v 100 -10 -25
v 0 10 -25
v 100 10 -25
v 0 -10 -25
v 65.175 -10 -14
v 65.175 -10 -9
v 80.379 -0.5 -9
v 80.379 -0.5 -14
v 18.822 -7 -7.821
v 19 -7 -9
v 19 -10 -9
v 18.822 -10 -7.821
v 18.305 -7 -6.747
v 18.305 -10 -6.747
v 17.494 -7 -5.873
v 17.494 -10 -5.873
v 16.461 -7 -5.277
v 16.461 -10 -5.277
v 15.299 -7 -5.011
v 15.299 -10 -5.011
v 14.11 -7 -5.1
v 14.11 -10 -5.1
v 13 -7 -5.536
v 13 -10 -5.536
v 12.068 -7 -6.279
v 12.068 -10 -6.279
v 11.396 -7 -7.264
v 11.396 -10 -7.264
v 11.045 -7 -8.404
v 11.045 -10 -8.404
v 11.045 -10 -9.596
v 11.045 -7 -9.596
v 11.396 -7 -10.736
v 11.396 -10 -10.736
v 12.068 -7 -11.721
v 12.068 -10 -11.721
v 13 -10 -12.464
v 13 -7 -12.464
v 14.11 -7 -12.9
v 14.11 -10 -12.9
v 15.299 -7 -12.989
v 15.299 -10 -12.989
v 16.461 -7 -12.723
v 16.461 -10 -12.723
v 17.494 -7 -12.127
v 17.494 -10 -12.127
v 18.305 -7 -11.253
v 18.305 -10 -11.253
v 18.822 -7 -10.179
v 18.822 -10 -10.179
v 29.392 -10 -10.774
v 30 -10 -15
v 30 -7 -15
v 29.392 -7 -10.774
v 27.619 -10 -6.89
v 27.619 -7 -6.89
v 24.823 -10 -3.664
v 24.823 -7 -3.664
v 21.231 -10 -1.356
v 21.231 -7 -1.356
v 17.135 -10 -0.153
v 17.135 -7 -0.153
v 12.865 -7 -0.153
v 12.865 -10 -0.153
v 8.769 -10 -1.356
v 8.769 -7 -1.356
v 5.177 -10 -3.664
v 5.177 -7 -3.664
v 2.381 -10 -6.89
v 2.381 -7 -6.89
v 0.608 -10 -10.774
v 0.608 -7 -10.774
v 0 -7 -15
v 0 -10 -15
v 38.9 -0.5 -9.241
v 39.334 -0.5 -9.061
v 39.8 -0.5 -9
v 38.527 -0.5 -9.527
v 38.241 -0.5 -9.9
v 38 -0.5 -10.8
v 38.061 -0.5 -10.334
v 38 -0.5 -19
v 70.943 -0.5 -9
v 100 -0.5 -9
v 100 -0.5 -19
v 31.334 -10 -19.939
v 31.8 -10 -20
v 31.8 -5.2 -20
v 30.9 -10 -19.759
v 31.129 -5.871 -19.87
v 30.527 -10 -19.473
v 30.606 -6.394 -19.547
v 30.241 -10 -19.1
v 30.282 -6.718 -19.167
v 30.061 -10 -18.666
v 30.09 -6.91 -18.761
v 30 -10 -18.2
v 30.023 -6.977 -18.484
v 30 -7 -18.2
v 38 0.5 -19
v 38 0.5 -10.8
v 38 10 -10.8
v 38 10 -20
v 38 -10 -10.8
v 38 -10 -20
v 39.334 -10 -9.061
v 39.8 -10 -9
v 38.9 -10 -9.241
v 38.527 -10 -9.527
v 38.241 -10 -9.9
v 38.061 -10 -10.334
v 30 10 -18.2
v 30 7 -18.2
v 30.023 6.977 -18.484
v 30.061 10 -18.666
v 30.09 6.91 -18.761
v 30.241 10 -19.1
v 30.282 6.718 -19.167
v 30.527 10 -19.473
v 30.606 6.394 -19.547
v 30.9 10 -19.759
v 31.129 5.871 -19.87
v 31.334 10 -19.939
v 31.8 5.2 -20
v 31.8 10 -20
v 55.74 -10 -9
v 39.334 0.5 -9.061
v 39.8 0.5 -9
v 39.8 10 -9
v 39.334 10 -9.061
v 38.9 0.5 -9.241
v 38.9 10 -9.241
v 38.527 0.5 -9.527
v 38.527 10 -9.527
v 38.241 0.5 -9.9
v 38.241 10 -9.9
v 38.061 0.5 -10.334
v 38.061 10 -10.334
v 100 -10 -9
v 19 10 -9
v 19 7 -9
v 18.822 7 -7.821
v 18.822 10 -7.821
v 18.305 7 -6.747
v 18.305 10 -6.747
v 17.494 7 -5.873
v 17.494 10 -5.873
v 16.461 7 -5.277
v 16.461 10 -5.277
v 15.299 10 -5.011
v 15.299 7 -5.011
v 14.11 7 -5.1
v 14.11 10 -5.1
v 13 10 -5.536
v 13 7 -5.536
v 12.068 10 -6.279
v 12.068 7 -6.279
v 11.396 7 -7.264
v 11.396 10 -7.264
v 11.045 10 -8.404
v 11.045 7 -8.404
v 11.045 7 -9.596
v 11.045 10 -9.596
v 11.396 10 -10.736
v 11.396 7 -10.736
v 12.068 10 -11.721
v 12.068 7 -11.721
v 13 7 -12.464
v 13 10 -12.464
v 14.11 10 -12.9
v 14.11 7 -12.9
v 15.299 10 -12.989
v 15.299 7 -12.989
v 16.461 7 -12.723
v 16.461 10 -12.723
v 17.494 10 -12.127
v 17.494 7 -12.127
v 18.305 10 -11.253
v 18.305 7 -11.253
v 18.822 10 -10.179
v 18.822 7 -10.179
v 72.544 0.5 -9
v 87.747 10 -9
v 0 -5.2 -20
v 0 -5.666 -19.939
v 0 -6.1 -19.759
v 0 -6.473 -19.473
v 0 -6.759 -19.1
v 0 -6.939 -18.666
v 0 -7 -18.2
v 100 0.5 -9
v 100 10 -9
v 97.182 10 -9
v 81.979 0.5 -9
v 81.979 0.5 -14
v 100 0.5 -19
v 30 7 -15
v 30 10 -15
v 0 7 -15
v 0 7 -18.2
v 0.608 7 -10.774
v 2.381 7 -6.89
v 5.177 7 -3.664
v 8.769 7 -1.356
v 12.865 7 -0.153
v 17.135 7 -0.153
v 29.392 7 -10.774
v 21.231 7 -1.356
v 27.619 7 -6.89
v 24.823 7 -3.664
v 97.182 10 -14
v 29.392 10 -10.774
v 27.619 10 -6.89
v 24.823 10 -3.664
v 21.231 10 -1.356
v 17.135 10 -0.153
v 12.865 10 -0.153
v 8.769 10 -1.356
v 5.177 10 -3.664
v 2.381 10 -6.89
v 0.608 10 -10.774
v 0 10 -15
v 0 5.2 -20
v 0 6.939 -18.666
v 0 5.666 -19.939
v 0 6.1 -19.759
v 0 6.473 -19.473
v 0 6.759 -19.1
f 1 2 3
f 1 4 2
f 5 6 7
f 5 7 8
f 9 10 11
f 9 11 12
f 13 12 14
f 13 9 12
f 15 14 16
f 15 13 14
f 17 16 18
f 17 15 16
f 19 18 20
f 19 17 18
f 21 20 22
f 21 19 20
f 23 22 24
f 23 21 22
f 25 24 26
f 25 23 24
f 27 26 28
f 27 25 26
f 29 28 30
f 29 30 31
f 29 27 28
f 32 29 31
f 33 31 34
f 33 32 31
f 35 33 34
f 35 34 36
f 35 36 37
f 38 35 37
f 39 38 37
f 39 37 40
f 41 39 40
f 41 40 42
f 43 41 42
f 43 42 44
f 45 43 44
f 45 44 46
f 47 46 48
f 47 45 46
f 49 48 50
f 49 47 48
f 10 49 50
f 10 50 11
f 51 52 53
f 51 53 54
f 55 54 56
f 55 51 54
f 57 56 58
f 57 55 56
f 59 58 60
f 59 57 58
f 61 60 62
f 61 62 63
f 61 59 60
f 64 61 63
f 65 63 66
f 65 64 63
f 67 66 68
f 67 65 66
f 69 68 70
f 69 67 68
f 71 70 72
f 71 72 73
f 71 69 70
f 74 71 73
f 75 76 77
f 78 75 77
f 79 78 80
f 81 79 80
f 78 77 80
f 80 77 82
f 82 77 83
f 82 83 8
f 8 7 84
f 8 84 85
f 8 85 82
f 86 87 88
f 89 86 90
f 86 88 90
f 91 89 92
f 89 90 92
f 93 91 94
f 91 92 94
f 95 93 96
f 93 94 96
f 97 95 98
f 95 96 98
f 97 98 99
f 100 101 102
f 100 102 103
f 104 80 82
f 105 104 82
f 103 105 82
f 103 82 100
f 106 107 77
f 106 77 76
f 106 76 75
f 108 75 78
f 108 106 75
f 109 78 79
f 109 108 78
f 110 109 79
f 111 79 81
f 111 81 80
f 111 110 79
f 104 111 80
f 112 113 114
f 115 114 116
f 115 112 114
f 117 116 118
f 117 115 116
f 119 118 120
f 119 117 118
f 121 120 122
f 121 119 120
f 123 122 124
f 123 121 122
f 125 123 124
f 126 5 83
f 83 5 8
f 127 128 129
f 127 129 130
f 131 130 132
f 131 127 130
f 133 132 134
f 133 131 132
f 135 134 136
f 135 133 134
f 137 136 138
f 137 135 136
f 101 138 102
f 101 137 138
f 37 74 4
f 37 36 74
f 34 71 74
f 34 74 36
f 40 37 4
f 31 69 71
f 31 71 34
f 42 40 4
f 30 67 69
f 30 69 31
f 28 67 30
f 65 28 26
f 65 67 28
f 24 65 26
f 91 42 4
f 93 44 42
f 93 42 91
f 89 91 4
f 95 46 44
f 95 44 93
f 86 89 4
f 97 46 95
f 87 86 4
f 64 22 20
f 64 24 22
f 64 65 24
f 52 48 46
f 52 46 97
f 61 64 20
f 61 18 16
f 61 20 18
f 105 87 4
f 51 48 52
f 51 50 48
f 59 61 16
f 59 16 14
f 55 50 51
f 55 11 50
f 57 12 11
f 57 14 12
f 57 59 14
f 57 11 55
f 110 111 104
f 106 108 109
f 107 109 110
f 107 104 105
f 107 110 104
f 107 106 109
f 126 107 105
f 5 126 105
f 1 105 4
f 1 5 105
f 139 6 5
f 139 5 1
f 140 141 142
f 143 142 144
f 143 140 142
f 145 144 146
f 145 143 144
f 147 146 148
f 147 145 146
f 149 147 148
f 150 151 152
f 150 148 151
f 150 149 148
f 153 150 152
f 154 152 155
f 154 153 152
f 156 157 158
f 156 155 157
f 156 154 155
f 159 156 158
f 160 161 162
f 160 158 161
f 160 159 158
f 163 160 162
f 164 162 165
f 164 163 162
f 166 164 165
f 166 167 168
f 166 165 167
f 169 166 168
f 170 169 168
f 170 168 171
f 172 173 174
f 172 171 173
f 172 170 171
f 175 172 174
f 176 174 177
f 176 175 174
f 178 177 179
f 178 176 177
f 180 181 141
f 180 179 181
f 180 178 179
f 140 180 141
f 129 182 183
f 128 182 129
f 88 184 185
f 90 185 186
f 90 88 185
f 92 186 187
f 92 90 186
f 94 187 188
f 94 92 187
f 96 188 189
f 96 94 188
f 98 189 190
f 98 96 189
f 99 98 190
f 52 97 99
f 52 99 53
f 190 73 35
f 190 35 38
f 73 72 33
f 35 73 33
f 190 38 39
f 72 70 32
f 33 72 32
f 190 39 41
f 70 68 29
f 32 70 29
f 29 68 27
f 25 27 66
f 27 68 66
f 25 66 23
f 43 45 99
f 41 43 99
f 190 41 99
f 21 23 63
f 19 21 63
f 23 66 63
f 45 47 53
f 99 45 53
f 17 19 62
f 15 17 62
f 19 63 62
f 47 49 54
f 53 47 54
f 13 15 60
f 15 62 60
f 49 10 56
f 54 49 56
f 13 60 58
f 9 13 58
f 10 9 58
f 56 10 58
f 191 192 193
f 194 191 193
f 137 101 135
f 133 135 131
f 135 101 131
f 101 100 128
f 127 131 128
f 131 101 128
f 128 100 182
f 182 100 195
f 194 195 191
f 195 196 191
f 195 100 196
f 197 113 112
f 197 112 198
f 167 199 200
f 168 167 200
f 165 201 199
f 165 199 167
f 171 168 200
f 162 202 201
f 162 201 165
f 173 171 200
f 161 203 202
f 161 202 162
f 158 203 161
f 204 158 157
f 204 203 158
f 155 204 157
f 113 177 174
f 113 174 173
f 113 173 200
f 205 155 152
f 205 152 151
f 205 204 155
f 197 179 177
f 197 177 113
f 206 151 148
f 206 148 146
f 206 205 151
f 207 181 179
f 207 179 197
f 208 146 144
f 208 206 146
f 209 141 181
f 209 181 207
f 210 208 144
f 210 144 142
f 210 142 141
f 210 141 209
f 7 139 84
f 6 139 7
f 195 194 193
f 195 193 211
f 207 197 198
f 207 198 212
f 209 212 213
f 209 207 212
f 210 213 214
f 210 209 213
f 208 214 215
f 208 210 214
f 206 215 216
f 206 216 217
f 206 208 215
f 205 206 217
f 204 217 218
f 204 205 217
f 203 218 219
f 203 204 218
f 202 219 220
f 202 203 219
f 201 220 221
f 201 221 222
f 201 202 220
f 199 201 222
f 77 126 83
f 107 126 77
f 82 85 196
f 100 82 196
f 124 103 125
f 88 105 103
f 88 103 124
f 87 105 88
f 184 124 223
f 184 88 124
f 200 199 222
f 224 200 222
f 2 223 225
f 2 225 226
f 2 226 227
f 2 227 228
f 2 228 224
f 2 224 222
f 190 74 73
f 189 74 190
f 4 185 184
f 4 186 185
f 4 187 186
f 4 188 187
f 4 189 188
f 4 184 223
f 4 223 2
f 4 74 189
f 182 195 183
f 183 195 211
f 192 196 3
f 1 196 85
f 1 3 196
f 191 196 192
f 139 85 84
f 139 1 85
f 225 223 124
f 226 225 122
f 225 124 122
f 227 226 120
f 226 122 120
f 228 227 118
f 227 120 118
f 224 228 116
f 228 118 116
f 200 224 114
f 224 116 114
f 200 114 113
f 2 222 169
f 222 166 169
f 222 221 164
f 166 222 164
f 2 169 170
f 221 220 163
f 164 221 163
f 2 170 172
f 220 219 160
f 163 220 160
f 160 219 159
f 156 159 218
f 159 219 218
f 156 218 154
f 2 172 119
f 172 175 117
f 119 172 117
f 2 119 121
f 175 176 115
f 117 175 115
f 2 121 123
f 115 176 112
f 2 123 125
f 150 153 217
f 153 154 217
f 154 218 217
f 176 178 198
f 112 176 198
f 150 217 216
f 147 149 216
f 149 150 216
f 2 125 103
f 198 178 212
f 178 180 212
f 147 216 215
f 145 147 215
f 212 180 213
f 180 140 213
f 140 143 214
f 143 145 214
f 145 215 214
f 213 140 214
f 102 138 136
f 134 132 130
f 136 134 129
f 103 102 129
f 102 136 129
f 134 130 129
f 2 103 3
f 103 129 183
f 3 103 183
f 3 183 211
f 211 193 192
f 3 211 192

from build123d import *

# Parameters (mm, degrees)
F0_R      = 4
F1_DEPTH  = 10
F3_DEPTH  = 7
F4_R      = 1.8
F9_DEPTH  = 25
F11_DEPTH = 40


with BuildPart() as f1:
    # F0 (on Front) → F1 (new body, symmetric)
    with BuildSketch(Plane.XZ):
        Polygon((0, -20), (0, -25), (100, -25), (100, -9), (38, -9), (38, -20), (30, -20), align=None)
        with BuildLine():
            Line((0, -15), (0, -20))
            Line((0, -20), (30, -20))
            Line((30, -20), (30, -15))
            ThreePointArc((30, -15), (15, 0), (0, -15))
        make_face()
        with Locations((15, -9)):
            Circle(F0_R, mode=Mode.SUBTRACT)
    extrude(amount=F1_DEPTH, both=True)

    # F2 (on Front) → F3 (cut, symmetric)
    with BuildSketch(Plane.XZ):
        with BuildLine():
            Line((30, -20), (30, -15))
            ThreePointArc((30, -15), (15, 0), (0, -15))
            Line((0, -15), (0, -20))
            Line((0, -20), (30, -20))
        make_face()
    extrude(amount=F3_DEPTH, both=True, mode=Mode.SUBTRACT)

    # F4
    f4_edges = [f1.edges().sort_by_distance(p)[0] for p in [
        (15, 7, -20),
        (15, -7, -20),
        (30, -8.5, -20),
        (30, 8.5, -20),
        (38, 0, -9),
    ]]
    fillet(f4_edges, radius=F4_R)

    # F8 (on face) → F9 (cut, symmetric)
    with BuildSketch(Plane(origin=(53.9389180046, 33.7047767362, 0), x_dir=(-0.5299192642, 0.8480480962, 0), z_dir=(0.8480480962, 0.5299192642, 0))):
        Polygon((-38.0182327263, -9), (-43.0182327263, -9), (-43.0182327263, -14), align=None)
    extrude(amount=F9_DEPTH, both=True, mode=Mode.SUBTRACT)

    # F10 (on offset) → F11 (cut, symmetric)
    with BuildSketch(Plane.YZ.offset(75)):
        Polygon((0.5, -9), (0, -9), (-0.5, -9), (-0.5, -19), (0.5, -19), align=None)
    extrude(amount=F11_DEPTH, both=True, mode=Mode.SUBTRACT)


solid = f1.part
